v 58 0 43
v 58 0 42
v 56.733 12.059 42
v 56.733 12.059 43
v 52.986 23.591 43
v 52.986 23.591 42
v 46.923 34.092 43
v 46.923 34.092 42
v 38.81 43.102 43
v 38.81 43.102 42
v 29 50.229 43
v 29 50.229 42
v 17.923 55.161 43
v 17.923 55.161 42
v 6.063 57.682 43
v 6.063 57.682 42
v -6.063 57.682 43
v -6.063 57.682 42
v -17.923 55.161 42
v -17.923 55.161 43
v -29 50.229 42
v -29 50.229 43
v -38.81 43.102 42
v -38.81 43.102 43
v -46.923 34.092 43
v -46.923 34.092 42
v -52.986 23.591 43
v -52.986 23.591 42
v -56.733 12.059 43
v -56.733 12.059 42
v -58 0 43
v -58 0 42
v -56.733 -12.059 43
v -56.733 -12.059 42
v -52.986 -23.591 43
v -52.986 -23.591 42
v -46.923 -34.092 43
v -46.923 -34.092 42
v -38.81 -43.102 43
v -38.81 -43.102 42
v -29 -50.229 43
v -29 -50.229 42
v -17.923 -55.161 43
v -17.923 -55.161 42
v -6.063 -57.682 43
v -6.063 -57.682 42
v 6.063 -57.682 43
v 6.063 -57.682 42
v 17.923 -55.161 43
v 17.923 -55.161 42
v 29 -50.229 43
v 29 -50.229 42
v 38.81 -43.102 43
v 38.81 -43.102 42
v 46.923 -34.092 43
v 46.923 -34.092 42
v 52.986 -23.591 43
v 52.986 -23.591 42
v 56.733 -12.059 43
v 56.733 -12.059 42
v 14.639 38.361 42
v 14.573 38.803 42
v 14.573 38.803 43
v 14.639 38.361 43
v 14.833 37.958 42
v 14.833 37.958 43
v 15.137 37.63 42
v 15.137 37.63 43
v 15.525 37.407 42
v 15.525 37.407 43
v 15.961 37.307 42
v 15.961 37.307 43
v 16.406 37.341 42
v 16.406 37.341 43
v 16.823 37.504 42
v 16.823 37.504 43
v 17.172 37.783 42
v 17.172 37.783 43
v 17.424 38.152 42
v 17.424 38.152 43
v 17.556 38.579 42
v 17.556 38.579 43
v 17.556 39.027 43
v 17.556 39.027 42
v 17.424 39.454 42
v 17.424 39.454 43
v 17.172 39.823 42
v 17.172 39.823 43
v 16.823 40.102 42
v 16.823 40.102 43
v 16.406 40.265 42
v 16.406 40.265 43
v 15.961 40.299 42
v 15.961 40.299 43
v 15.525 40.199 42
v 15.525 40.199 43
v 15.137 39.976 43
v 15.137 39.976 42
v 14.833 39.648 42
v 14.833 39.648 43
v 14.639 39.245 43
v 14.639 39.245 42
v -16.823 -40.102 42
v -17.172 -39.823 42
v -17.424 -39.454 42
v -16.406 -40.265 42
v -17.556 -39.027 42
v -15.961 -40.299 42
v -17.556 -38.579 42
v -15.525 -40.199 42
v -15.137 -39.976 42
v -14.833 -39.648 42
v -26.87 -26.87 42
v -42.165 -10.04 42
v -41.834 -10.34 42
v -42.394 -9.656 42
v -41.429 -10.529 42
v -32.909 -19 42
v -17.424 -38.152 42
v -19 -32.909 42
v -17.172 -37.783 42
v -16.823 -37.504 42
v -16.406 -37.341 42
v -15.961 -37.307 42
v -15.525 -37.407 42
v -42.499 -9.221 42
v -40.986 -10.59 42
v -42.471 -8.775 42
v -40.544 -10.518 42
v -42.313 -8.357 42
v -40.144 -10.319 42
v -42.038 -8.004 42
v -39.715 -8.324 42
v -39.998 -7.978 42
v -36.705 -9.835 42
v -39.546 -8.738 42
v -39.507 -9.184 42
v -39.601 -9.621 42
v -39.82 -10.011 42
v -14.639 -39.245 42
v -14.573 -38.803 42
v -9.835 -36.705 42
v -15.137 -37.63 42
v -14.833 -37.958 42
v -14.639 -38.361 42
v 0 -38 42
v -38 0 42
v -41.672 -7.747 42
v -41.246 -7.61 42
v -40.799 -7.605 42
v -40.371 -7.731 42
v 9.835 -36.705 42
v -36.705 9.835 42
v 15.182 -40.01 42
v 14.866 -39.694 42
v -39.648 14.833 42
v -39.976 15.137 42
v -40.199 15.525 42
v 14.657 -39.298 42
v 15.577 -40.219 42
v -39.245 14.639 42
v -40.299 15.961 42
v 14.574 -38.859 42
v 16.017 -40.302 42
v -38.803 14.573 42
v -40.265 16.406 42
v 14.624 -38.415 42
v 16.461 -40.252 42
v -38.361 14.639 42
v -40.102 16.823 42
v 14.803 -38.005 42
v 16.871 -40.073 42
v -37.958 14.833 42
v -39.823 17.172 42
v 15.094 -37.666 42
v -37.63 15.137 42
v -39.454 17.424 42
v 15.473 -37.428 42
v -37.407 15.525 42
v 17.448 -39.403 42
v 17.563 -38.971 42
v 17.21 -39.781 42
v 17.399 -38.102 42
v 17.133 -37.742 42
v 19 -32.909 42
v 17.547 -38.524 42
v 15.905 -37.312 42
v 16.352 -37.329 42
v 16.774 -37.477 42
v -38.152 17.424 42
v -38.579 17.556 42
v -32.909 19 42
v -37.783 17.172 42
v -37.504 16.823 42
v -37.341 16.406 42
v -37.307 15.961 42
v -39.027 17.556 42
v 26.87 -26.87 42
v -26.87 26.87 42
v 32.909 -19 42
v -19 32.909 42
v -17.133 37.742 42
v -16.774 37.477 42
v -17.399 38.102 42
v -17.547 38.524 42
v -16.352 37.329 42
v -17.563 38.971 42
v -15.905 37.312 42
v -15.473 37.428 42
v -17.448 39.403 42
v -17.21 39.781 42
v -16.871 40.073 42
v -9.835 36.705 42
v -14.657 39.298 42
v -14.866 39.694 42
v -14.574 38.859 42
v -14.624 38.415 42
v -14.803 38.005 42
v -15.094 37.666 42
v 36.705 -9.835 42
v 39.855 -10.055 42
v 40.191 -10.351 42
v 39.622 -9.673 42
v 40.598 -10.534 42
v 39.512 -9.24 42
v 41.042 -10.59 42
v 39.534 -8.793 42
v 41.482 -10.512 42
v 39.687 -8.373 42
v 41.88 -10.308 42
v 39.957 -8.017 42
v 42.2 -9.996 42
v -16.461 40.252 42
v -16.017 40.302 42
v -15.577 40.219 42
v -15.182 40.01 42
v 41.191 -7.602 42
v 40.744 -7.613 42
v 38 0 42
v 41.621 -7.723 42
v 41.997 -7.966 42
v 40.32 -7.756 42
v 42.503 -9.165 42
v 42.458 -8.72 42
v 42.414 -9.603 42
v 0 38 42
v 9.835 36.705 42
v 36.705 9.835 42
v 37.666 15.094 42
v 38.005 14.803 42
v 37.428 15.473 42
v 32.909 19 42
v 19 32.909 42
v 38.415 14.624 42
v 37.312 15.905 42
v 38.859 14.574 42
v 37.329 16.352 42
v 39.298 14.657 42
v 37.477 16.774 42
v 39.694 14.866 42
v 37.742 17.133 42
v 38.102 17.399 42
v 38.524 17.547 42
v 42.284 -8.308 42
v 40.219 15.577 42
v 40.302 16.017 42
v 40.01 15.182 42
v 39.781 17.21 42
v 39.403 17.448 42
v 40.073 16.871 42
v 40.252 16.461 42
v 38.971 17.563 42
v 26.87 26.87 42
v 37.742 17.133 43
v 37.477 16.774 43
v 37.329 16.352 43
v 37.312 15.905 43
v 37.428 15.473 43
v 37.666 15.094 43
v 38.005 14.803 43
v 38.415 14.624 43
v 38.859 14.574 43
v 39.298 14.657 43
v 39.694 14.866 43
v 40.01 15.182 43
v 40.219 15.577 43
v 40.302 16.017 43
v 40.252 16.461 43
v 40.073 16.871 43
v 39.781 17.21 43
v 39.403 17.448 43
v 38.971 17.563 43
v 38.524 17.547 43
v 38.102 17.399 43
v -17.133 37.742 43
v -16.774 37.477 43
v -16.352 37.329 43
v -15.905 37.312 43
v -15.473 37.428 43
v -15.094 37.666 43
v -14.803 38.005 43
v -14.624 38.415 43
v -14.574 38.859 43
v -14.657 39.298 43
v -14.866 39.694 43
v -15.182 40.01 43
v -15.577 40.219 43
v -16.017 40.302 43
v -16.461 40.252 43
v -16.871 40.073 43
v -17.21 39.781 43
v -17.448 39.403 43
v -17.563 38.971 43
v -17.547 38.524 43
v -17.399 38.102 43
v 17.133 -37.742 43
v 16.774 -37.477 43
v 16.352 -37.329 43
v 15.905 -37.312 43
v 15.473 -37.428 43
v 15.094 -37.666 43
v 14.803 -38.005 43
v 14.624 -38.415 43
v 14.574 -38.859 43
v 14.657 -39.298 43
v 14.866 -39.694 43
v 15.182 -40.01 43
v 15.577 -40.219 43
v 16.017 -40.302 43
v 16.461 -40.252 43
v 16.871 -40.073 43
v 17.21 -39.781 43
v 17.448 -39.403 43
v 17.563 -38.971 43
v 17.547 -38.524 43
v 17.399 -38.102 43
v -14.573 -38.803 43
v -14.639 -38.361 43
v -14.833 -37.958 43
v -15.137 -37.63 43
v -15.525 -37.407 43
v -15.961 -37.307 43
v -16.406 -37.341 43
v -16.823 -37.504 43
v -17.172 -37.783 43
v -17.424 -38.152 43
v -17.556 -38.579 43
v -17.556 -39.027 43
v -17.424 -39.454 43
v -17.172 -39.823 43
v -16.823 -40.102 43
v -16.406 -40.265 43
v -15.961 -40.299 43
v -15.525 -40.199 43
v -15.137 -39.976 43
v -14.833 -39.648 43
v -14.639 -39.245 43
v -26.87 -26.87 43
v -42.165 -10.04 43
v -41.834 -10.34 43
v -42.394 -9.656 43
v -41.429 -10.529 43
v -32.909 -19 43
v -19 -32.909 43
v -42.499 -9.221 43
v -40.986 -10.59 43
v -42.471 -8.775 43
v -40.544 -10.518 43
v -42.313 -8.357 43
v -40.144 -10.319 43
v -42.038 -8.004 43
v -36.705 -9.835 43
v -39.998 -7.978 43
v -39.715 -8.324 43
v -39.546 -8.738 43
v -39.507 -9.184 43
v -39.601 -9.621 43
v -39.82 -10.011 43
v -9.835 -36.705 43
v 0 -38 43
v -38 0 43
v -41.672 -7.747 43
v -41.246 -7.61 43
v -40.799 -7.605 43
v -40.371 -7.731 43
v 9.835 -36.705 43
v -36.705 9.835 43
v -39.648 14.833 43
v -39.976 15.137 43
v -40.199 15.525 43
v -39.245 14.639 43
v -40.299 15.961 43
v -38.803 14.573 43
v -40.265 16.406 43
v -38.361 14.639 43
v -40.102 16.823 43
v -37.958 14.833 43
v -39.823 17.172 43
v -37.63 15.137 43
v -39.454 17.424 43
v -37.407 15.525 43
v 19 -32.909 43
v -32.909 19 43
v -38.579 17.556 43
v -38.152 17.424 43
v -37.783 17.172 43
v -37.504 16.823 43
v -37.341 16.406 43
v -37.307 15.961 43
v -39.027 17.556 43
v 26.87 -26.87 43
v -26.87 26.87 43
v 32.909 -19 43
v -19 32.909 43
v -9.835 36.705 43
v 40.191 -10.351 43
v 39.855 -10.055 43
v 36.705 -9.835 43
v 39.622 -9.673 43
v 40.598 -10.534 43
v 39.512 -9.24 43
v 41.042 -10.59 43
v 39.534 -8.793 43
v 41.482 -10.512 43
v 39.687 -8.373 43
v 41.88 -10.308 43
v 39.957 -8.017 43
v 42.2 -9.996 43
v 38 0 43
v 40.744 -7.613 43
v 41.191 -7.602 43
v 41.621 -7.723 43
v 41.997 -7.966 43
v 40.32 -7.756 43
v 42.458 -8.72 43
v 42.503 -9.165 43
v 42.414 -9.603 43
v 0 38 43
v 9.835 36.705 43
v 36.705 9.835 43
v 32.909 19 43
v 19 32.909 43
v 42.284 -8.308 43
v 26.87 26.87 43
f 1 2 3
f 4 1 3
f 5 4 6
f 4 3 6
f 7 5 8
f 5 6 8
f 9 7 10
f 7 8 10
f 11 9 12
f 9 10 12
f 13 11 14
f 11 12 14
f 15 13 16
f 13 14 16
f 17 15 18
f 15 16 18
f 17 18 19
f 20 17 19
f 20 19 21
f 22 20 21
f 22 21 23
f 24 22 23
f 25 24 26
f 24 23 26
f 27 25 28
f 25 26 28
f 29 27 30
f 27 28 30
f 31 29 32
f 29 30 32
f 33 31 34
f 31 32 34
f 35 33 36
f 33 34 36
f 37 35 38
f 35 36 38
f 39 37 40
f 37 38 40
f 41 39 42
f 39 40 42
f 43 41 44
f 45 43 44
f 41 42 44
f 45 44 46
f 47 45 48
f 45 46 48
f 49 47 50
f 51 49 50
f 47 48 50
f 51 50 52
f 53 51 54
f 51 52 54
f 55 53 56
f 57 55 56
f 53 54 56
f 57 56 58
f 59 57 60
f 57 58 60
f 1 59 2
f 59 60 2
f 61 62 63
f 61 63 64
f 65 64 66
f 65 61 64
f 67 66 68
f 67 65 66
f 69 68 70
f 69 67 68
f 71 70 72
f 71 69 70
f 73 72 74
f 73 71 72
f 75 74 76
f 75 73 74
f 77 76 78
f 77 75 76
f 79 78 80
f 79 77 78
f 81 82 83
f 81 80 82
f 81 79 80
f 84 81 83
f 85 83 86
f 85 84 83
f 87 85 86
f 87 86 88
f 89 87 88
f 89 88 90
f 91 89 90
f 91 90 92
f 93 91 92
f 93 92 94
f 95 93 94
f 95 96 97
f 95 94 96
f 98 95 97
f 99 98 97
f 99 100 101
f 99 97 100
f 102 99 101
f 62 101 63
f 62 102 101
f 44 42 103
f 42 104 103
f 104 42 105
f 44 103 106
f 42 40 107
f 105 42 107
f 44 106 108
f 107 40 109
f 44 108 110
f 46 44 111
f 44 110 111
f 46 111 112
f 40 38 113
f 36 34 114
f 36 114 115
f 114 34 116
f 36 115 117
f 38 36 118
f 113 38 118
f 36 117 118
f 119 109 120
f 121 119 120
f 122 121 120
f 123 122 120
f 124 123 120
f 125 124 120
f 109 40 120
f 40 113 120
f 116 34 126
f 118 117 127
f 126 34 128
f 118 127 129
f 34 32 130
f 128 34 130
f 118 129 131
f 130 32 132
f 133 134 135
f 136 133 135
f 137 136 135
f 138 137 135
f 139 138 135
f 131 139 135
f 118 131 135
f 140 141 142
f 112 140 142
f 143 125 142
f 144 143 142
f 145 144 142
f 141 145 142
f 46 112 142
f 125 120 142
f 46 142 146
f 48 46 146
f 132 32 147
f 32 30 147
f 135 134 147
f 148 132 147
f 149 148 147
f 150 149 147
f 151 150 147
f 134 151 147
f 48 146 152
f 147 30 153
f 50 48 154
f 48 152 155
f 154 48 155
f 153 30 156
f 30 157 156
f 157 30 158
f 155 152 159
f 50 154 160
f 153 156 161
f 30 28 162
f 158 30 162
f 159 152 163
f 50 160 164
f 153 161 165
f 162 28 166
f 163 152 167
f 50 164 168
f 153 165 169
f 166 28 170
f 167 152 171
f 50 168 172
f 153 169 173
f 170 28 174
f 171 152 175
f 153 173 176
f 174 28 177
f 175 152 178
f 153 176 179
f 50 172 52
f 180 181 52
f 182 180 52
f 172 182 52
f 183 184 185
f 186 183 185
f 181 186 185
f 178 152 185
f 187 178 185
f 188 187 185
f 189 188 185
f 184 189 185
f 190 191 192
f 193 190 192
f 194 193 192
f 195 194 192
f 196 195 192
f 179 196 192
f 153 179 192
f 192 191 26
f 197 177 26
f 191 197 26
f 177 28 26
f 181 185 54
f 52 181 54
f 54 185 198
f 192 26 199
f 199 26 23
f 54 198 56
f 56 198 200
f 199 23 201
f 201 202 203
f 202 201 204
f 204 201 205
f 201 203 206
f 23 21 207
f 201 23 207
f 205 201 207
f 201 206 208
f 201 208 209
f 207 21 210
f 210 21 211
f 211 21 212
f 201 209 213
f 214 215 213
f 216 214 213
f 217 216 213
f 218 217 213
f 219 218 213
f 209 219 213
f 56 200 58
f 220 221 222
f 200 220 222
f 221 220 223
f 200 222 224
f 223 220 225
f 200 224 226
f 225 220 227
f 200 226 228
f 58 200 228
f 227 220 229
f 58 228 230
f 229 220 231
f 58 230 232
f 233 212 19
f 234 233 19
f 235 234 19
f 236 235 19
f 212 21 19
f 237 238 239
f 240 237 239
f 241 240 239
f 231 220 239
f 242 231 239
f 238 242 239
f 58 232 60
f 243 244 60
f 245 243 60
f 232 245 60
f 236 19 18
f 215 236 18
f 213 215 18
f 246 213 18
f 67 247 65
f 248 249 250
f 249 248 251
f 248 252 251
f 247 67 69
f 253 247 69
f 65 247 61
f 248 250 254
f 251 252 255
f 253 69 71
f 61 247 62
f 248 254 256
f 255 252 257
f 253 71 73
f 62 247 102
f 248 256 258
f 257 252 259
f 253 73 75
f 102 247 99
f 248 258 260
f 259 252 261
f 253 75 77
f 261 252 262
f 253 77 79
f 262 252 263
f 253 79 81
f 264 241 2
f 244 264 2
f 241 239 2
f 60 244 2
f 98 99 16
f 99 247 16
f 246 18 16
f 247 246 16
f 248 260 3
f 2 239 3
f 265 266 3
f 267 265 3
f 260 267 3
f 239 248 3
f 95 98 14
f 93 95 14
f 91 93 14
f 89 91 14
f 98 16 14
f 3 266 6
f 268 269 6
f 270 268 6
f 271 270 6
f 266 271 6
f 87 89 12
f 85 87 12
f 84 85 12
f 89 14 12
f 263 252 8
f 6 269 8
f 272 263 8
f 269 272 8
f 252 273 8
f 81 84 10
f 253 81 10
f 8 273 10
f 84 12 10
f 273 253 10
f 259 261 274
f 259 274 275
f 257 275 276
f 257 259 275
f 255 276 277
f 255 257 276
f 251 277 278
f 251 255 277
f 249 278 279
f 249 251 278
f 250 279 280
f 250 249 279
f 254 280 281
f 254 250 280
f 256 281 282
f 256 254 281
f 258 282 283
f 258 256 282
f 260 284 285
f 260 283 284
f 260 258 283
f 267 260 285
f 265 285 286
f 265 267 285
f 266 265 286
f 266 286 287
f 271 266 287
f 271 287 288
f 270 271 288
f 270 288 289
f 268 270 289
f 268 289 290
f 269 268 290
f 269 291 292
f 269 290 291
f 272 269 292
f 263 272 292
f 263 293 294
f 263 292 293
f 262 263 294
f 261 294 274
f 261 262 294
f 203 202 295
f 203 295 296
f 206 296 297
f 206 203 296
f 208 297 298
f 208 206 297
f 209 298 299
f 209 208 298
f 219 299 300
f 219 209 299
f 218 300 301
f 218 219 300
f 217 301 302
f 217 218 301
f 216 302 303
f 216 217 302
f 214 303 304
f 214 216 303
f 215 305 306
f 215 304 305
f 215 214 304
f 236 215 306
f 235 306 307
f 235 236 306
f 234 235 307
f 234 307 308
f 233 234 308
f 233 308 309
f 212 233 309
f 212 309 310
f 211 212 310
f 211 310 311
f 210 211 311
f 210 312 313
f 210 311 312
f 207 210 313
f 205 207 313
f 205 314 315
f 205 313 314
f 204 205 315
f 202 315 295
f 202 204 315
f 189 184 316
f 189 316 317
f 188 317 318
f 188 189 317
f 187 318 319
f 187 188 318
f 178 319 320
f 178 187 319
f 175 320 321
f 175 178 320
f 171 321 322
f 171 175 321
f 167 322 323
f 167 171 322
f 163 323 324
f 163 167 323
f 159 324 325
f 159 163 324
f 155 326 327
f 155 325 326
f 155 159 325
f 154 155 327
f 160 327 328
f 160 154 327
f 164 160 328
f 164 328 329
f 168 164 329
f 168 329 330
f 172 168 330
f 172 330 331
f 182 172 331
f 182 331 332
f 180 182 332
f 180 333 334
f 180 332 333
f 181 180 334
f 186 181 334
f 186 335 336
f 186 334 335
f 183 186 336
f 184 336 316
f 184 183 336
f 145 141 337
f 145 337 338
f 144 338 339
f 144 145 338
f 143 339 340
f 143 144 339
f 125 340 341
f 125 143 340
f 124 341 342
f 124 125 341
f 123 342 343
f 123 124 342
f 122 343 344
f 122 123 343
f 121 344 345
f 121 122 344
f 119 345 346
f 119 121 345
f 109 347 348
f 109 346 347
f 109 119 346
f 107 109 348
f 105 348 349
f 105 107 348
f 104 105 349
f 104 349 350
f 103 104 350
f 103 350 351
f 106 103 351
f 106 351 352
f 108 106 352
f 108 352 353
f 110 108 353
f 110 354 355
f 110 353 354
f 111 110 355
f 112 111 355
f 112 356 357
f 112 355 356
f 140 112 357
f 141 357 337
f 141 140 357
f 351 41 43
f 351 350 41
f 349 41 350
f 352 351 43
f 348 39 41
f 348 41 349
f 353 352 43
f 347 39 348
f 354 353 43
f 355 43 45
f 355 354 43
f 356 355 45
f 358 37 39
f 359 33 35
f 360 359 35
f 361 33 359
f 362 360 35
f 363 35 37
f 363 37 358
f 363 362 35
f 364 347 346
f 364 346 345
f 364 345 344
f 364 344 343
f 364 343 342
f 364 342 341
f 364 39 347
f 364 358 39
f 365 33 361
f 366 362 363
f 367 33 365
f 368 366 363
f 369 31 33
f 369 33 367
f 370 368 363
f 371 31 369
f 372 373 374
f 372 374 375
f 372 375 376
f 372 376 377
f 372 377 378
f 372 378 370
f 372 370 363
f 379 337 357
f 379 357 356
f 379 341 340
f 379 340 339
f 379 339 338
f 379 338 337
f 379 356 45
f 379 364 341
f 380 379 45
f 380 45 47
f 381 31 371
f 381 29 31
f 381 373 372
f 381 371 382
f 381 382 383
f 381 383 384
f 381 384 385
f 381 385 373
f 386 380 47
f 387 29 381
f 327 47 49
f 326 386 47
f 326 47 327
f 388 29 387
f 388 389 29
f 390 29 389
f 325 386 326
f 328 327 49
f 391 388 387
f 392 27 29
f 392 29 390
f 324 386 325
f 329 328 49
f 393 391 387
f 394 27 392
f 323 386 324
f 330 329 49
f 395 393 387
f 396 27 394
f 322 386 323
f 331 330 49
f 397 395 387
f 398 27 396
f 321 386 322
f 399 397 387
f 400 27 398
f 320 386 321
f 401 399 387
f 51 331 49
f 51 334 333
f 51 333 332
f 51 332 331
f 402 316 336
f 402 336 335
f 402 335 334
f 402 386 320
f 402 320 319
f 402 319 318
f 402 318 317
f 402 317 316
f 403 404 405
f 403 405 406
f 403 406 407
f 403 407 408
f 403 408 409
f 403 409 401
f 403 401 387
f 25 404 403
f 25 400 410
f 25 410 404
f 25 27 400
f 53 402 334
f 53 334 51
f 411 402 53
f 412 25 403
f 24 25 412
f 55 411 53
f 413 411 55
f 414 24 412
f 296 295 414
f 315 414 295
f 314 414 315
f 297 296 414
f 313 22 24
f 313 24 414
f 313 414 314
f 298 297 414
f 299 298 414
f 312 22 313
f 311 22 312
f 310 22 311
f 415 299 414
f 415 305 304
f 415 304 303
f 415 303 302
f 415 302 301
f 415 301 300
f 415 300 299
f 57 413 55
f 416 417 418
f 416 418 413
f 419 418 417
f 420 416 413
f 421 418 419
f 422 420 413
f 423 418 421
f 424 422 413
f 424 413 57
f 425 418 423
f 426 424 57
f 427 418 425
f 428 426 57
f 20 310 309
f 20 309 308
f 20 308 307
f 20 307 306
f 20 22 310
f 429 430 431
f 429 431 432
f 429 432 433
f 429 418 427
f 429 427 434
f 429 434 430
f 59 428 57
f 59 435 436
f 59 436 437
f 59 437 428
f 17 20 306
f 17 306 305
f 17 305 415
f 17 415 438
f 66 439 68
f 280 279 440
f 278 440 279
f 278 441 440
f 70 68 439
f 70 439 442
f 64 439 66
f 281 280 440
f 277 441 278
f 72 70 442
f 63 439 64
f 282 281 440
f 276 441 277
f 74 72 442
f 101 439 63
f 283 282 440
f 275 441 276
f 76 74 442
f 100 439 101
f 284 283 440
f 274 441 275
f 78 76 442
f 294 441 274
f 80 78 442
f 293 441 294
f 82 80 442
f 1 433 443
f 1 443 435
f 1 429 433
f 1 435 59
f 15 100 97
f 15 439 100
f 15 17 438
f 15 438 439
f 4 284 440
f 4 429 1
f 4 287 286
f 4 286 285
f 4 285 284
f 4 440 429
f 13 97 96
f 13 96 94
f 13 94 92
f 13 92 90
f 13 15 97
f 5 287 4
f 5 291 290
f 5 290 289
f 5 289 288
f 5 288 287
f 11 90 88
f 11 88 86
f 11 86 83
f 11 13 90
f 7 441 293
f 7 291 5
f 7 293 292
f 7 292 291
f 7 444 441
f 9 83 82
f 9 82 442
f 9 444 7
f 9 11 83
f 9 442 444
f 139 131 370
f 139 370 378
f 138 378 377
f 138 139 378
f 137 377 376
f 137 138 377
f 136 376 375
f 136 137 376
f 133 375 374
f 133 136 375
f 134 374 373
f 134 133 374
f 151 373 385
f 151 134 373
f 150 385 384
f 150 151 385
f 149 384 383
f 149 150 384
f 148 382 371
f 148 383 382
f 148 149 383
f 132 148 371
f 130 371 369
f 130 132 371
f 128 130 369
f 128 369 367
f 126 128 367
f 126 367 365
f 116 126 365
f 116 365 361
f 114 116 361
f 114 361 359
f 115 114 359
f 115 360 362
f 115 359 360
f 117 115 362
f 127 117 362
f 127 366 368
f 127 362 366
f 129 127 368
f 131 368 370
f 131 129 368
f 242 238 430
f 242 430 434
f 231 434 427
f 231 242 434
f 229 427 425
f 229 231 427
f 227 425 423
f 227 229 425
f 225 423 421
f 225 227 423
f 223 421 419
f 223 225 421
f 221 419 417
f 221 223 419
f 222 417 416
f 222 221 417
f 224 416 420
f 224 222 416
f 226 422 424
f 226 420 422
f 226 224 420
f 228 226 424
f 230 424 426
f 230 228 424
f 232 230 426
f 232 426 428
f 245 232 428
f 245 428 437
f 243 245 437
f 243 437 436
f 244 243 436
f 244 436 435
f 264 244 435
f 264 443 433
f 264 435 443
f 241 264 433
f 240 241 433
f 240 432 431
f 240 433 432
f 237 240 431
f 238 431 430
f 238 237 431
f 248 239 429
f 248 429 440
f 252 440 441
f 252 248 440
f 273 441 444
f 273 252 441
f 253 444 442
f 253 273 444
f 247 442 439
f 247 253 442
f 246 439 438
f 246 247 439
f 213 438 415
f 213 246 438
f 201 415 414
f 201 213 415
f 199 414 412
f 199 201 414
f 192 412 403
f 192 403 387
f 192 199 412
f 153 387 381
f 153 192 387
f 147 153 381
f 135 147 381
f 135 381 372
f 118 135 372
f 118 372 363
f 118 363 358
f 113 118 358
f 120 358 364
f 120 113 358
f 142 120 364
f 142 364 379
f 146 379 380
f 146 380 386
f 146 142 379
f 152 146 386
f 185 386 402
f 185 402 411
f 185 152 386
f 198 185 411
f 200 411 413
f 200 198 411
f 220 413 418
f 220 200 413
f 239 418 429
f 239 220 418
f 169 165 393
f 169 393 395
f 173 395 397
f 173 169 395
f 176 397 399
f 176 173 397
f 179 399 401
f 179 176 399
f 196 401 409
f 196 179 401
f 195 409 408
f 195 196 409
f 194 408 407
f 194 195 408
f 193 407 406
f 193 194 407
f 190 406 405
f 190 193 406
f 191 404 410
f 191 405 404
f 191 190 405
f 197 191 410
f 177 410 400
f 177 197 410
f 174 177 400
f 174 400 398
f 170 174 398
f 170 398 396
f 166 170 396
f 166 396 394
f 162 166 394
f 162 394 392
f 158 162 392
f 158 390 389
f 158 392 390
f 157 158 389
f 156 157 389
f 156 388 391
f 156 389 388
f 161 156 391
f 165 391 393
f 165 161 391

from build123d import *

# Parameters (mm, degrees)
CYLINDER757_R               = 1.5
CYLINDER757_DEPTH           = 100
CYLINDER757_PLACEMENT_ANGLE = 100
CYLINDER755_R               = 1.5
CYLINDER755_DEPTH           = 100
CYLINDER755_PLACEMENT_ANGLE = 135
CYLINDER759_R               = 1.5
CYLINDER759_DEPTH           = 100
CYLINDER761_R               = 1.5
CYLINDER761_DEPTH           = 100
CYLINDER761_PLACEMENT_ANGLE = 225
CYLINDER754_R               = 1.5
CYLINDER754_DEPTH           = 100
CYLINDER758_R               = 1.5
CYLINDER758_DEPTH           = 100
CYLINDER758_PLACEMENT_ANGLE = 55
CYLINDER756_R               = 1.5
CYLINDER756_DEPTH           = 100
CYLINDER760_R               = 1.5
CYLINDER760_DEPTH           = 100
CYLINDER760_PLACEMENT_ANGLE = 45
TUBE079_R                   = 58
TUBE079_R_2                 = 38
TUBE079_DEPTH               = 1


with BuildPart() as v_lec757:
    # Cylinder757 → Cylinder757 (new body)
    with BuildSketch(Plane.XY):
        Circle(CYLINDER757_R)
    extrude(amount=CYLINDER757_DEPTH)


with BuildPart() as v_lec757_1:
    # Cylinder757 placement: moved
    add(v_lec757.part.moved(Location((41.004432, -9.090464, 0))).rotate(Axis((41.004432, -9.090464, 0), (0, 0, 1)), CYLINDER757_PLACEMENT_ANGLE))


with BuildPart() as v_lec755:
    # Cylinder755 → Cylinder755 (new body)
    with BuildSketch(Plane.XY):
        Circle(CYLINDER755_R)
    extrude(amount=CYLINDER755_DEPTH)


with BuildPart() as v_lec755_1:
    # Cylinder755 placement: moved
    add(v_lec755.part.moved(Location((38.80294, 16.072704, 0))).rotate(Axis((38.80294, 16.072704, 0), (0, 0, 1)), CYLINDER755_PLACEMENT_ANGLE))


with BuildPart() as v_lec759:
    # Cylinder759 → Cylinder759 (new body)
    with BuildSketch(Plane(origin=(16.072704, 38.80294, 0), x_dir=(-1, 0, 0), z_dir=(0, 0, 1))):
        Circle(CYLINDER759_R)
    extrude(amount=CYLINDER759_DEPTH)


with BuildPart() as v_lec761:
    # Cylinder761 → Cylinder761 (new body)
    with BuildSketch(Plane.XY):
        Circle(CYLINDER761_R)
    extrude(amount=CYLINDER761_DEPTH)


with BuildPart() as v_lec761_1:
    # Cylinder761 placement: moved
    add(v_lec761.part.moved(Location((-16.072704, 38.80294, 0))).rotate(Axis((-16.072704, 38.80294, 0), (0, 0, 1)), CYLINDER761_PLACEMENT_ANGLE))


with BuildPart() as v_lec754:
    # Cylinder754 → Cylinder754 (new body)
    with BuildSketch(Plane(origin=(-38.80294, 16.072704, 0), x_dir=(0, -1, 0), z_dir=(0, 0, 1))):
        Circle(CYLINDER754_R)
    extrude(amount=CYLINDER754_DEPTH)


with BuildPart() as v_lec758:
    # Cylinder758 → Cylinder758 (new body)
    with BuildSketch(Plane.XY):
        Circle(CYLINDER758_R)
    extrude(amount=CYLINDER758_DEPTH)


with BuildPart() as v_lec758_1:
    # Cylinder758 placement: moved
    add(v_lec758.part.moved(Location((-41.004432, -9.090464, 0))).rotate(Axis((-41.004432, -9.090464, 0), (0, 0, -1)), CYLINDER758_PLACEMENT_ANGLE))


with BuildPart() as v_lec756:
    # Cylinder756 → Cylinder756 (new body)
    with BuildSketch(Plane(origin=(-16.072704, -38.80294, 0), x_dir=(1, 0, 0), z_dir=(0, 0, 1))):
        Circle(CYLINDER756_R)
    extrude(amount=CYLINDER756_DEPTH)


with BuildPart() as compound709:
    # Cylinder760 → Cylinder760 (new body)
    with BuildSketch(Plane.XY):
        Circle(CYLINDER760_R)
    extrude(amount=CYLINDER760_DEPTH)


with BuildPart() as compound709_1:
    # Cylinder760 placement: moved
    add(compound709.part.moved(Location((16.072704, -38.80294, 0))).rotate(Axis((16.072704, -38.80294, 0), (0, 0, 1)), CYLINDER760_PLACEMENT_ANGLE))

    # Compound709: union Válec757, Válec755, Válec759, Válec761, Válec754, Válec758, Válec756
    add(v_lec757_1.part)
    add(v_lec755_1.part)
    add(v_lec759.part)
    add(v_lec761_1.part)
    add(v_lec754.part)
    add(v_lec758_1.part)
    add(v_lec756.part)


with BuildPart() as bazovina_part_f_washer:
    # Tube079 → Tube079 (new body)
    with BuildSketch(Plane.XY.offset(42)):
        Circle(TUBE079_R)
        Circle(TUBE079_R_2, mode=Mode.SUBTRACT)
    extrude(amount=TUBE079_DEPTH)

    # Cut325: cut Compound709
    add(compound709_1.part, mode=Mode.SUBTRACT)


solid = bazovina_part_f_washer.part
